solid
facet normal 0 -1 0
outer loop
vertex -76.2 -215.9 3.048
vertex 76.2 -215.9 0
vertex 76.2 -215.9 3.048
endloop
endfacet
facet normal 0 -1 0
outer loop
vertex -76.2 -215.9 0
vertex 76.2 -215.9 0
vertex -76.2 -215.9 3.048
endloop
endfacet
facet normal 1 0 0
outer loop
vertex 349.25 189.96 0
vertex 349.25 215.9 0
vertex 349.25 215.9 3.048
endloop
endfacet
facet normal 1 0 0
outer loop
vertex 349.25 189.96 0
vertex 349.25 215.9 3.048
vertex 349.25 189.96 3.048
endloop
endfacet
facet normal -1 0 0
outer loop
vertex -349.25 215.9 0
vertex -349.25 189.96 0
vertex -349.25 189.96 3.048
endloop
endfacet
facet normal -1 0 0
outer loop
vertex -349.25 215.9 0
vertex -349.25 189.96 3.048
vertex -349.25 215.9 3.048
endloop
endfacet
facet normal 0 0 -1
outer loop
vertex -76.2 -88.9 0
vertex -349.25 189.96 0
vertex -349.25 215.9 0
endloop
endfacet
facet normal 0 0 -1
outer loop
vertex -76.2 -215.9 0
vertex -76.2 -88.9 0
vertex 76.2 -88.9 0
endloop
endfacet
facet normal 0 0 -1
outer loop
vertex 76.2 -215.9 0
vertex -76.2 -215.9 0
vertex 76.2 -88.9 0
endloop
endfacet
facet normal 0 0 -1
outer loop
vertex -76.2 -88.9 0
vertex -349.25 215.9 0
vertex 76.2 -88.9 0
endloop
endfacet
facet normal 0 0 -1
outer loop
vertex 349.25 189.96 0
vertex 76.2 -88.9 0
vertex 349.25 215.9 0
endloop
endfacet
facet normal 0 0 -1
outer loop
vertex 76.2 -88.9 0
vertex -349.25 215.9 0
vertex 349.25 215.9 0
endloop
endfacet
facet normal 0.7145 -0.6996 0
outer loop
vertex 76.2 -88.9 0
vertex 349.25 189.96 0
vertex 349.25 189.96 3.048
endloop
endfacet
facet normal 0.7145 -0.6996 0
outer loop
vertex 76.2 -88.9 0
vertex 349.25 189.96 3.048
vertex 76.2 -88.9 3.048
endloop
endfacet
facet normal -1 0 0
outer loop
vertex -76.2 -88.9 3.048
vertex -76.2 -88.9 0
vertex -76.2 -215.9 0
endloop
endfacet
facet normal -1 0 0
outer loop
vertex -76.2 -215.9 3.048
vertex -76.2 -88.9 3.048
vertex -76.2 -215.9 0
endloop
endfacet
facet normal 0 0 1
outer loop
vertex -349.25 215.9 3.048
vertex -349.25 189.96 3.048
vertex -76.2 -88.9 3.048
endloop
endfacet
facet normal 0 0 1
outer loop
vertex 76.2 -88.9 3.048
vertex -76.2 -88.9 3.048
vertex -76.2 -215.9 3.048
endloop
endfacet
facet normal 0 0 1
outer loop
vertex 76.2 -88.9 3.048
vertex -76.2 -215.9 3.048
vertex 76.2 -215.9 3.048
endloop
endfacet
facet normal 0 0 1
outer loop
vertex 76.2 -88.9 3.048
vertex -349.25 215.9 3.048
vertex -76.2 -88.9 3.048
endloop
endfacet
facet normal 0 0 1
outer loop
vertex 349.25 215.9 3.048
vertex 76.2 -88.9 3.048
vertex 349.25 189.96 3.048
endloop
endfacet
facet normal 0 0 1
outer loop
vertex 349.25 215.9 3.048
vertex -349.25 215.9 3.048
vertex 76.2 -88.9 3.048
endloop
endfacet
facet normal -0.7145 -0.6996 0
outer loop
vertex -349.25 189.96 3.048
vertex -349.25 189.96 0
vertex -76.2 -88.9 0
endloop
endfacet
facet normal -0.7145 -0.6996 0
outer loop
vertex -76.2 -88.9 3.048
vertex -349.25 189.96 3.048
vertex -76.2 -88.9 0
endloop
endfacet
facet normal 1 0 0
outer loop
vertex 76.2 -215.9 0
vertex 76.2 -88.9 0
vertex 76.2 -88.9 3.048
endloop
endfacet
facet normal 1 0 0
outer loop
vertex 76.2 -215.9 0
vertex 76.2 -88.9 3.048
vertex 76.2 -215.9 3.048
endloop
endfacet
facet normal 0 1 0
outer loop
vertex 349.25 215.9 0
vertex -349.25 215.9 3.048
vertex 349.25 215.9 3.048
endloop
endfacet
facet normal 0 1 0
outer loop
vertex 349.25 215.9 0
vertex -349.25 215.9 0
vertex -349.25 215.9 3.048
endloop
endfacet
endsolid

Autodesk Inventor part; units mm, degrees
ref_plane "YZ Plane" through (0, 0, 0) normal (1, 0, 0) x (0, 1, 0)
ref_plane "XZ Plane" through (0, 0, 0) normal (0, 1, 0) x (-1, 0, 0)
ref_plane "XY Plane" through (0, 0, 0) normal (0, 0, 1) x (1, 0, 0)
sketch "Sketch1" plane through (0, 0, 0) normal (0, 0, 1) x (1, 0, 0)
  line L0 (374.65, -215.9) -> (-374.65, -215.9)
  line L1 (-374.65, -215.9) -> (-374.65, 215.9)
  line L2 (-374.65, 215.9) -> (374.65, 215.9)
  line L3 (374.65, 215.9) -> (374.65, -215.9)
  line L4 (374.65, -215.9) -> (-374.65, 215.9) construction
  line L5 (-374.65, -215.9) -> (374.65, 215.9) construction
  line L6 (-374.65, -88.9) -> (374.65, -88.9) construction
  line L7 (-374.65, 215.9) -> (-76.2, -88.9)
  line L8 (374.65, 215.9) -> (76.2, -88.9)
  line L9 (-76.2, -88.9) -> (-76.2, -215.9)
  line L10 (76.2, -88.9) -> (76.2, -215.9)
  line L11 (-349.25, 189.9596) -> (-349.25, 215.9)
  line L12 (349.25, 215.9) -> (349.25, 189.9596)
  point P0 (0, 0)
  dimension "d0" = 749.3
  dimension "d1" = 431.8
  dimension "d5" = 152.4
  dimension "d6" = 76.2
  dimension "d7" = 127
  dimension "d8" = 25.4
  dimension "d9" = 25.4
extrude "Plate1" add sketch "Sketch1" along normal blind 3.048 contours L0 L9 L7 L11 L2 L12 L8 L10
equation "\"d2\" = Thickness"
equation "\"BendRadius\" = Thickness"
equation "\"BendReliefWidth\" = Thickness"
equation "\"BendReliefDepth\" = 0.5 * Thickness"
equation "\"CornerReliefSize\" = 4 * Thickness"
equation "\"MinimumRemnant\" = 2 * Thickness"
equation "\"TransitionRadius\" = BendRadius"
equation "\"JacobiRadiusSize\" = BendRadius"
equation "\"GapSize\" = Thickness"
equation "\"Thickness\" = 3.048"
properties part number "trough_backplate"
